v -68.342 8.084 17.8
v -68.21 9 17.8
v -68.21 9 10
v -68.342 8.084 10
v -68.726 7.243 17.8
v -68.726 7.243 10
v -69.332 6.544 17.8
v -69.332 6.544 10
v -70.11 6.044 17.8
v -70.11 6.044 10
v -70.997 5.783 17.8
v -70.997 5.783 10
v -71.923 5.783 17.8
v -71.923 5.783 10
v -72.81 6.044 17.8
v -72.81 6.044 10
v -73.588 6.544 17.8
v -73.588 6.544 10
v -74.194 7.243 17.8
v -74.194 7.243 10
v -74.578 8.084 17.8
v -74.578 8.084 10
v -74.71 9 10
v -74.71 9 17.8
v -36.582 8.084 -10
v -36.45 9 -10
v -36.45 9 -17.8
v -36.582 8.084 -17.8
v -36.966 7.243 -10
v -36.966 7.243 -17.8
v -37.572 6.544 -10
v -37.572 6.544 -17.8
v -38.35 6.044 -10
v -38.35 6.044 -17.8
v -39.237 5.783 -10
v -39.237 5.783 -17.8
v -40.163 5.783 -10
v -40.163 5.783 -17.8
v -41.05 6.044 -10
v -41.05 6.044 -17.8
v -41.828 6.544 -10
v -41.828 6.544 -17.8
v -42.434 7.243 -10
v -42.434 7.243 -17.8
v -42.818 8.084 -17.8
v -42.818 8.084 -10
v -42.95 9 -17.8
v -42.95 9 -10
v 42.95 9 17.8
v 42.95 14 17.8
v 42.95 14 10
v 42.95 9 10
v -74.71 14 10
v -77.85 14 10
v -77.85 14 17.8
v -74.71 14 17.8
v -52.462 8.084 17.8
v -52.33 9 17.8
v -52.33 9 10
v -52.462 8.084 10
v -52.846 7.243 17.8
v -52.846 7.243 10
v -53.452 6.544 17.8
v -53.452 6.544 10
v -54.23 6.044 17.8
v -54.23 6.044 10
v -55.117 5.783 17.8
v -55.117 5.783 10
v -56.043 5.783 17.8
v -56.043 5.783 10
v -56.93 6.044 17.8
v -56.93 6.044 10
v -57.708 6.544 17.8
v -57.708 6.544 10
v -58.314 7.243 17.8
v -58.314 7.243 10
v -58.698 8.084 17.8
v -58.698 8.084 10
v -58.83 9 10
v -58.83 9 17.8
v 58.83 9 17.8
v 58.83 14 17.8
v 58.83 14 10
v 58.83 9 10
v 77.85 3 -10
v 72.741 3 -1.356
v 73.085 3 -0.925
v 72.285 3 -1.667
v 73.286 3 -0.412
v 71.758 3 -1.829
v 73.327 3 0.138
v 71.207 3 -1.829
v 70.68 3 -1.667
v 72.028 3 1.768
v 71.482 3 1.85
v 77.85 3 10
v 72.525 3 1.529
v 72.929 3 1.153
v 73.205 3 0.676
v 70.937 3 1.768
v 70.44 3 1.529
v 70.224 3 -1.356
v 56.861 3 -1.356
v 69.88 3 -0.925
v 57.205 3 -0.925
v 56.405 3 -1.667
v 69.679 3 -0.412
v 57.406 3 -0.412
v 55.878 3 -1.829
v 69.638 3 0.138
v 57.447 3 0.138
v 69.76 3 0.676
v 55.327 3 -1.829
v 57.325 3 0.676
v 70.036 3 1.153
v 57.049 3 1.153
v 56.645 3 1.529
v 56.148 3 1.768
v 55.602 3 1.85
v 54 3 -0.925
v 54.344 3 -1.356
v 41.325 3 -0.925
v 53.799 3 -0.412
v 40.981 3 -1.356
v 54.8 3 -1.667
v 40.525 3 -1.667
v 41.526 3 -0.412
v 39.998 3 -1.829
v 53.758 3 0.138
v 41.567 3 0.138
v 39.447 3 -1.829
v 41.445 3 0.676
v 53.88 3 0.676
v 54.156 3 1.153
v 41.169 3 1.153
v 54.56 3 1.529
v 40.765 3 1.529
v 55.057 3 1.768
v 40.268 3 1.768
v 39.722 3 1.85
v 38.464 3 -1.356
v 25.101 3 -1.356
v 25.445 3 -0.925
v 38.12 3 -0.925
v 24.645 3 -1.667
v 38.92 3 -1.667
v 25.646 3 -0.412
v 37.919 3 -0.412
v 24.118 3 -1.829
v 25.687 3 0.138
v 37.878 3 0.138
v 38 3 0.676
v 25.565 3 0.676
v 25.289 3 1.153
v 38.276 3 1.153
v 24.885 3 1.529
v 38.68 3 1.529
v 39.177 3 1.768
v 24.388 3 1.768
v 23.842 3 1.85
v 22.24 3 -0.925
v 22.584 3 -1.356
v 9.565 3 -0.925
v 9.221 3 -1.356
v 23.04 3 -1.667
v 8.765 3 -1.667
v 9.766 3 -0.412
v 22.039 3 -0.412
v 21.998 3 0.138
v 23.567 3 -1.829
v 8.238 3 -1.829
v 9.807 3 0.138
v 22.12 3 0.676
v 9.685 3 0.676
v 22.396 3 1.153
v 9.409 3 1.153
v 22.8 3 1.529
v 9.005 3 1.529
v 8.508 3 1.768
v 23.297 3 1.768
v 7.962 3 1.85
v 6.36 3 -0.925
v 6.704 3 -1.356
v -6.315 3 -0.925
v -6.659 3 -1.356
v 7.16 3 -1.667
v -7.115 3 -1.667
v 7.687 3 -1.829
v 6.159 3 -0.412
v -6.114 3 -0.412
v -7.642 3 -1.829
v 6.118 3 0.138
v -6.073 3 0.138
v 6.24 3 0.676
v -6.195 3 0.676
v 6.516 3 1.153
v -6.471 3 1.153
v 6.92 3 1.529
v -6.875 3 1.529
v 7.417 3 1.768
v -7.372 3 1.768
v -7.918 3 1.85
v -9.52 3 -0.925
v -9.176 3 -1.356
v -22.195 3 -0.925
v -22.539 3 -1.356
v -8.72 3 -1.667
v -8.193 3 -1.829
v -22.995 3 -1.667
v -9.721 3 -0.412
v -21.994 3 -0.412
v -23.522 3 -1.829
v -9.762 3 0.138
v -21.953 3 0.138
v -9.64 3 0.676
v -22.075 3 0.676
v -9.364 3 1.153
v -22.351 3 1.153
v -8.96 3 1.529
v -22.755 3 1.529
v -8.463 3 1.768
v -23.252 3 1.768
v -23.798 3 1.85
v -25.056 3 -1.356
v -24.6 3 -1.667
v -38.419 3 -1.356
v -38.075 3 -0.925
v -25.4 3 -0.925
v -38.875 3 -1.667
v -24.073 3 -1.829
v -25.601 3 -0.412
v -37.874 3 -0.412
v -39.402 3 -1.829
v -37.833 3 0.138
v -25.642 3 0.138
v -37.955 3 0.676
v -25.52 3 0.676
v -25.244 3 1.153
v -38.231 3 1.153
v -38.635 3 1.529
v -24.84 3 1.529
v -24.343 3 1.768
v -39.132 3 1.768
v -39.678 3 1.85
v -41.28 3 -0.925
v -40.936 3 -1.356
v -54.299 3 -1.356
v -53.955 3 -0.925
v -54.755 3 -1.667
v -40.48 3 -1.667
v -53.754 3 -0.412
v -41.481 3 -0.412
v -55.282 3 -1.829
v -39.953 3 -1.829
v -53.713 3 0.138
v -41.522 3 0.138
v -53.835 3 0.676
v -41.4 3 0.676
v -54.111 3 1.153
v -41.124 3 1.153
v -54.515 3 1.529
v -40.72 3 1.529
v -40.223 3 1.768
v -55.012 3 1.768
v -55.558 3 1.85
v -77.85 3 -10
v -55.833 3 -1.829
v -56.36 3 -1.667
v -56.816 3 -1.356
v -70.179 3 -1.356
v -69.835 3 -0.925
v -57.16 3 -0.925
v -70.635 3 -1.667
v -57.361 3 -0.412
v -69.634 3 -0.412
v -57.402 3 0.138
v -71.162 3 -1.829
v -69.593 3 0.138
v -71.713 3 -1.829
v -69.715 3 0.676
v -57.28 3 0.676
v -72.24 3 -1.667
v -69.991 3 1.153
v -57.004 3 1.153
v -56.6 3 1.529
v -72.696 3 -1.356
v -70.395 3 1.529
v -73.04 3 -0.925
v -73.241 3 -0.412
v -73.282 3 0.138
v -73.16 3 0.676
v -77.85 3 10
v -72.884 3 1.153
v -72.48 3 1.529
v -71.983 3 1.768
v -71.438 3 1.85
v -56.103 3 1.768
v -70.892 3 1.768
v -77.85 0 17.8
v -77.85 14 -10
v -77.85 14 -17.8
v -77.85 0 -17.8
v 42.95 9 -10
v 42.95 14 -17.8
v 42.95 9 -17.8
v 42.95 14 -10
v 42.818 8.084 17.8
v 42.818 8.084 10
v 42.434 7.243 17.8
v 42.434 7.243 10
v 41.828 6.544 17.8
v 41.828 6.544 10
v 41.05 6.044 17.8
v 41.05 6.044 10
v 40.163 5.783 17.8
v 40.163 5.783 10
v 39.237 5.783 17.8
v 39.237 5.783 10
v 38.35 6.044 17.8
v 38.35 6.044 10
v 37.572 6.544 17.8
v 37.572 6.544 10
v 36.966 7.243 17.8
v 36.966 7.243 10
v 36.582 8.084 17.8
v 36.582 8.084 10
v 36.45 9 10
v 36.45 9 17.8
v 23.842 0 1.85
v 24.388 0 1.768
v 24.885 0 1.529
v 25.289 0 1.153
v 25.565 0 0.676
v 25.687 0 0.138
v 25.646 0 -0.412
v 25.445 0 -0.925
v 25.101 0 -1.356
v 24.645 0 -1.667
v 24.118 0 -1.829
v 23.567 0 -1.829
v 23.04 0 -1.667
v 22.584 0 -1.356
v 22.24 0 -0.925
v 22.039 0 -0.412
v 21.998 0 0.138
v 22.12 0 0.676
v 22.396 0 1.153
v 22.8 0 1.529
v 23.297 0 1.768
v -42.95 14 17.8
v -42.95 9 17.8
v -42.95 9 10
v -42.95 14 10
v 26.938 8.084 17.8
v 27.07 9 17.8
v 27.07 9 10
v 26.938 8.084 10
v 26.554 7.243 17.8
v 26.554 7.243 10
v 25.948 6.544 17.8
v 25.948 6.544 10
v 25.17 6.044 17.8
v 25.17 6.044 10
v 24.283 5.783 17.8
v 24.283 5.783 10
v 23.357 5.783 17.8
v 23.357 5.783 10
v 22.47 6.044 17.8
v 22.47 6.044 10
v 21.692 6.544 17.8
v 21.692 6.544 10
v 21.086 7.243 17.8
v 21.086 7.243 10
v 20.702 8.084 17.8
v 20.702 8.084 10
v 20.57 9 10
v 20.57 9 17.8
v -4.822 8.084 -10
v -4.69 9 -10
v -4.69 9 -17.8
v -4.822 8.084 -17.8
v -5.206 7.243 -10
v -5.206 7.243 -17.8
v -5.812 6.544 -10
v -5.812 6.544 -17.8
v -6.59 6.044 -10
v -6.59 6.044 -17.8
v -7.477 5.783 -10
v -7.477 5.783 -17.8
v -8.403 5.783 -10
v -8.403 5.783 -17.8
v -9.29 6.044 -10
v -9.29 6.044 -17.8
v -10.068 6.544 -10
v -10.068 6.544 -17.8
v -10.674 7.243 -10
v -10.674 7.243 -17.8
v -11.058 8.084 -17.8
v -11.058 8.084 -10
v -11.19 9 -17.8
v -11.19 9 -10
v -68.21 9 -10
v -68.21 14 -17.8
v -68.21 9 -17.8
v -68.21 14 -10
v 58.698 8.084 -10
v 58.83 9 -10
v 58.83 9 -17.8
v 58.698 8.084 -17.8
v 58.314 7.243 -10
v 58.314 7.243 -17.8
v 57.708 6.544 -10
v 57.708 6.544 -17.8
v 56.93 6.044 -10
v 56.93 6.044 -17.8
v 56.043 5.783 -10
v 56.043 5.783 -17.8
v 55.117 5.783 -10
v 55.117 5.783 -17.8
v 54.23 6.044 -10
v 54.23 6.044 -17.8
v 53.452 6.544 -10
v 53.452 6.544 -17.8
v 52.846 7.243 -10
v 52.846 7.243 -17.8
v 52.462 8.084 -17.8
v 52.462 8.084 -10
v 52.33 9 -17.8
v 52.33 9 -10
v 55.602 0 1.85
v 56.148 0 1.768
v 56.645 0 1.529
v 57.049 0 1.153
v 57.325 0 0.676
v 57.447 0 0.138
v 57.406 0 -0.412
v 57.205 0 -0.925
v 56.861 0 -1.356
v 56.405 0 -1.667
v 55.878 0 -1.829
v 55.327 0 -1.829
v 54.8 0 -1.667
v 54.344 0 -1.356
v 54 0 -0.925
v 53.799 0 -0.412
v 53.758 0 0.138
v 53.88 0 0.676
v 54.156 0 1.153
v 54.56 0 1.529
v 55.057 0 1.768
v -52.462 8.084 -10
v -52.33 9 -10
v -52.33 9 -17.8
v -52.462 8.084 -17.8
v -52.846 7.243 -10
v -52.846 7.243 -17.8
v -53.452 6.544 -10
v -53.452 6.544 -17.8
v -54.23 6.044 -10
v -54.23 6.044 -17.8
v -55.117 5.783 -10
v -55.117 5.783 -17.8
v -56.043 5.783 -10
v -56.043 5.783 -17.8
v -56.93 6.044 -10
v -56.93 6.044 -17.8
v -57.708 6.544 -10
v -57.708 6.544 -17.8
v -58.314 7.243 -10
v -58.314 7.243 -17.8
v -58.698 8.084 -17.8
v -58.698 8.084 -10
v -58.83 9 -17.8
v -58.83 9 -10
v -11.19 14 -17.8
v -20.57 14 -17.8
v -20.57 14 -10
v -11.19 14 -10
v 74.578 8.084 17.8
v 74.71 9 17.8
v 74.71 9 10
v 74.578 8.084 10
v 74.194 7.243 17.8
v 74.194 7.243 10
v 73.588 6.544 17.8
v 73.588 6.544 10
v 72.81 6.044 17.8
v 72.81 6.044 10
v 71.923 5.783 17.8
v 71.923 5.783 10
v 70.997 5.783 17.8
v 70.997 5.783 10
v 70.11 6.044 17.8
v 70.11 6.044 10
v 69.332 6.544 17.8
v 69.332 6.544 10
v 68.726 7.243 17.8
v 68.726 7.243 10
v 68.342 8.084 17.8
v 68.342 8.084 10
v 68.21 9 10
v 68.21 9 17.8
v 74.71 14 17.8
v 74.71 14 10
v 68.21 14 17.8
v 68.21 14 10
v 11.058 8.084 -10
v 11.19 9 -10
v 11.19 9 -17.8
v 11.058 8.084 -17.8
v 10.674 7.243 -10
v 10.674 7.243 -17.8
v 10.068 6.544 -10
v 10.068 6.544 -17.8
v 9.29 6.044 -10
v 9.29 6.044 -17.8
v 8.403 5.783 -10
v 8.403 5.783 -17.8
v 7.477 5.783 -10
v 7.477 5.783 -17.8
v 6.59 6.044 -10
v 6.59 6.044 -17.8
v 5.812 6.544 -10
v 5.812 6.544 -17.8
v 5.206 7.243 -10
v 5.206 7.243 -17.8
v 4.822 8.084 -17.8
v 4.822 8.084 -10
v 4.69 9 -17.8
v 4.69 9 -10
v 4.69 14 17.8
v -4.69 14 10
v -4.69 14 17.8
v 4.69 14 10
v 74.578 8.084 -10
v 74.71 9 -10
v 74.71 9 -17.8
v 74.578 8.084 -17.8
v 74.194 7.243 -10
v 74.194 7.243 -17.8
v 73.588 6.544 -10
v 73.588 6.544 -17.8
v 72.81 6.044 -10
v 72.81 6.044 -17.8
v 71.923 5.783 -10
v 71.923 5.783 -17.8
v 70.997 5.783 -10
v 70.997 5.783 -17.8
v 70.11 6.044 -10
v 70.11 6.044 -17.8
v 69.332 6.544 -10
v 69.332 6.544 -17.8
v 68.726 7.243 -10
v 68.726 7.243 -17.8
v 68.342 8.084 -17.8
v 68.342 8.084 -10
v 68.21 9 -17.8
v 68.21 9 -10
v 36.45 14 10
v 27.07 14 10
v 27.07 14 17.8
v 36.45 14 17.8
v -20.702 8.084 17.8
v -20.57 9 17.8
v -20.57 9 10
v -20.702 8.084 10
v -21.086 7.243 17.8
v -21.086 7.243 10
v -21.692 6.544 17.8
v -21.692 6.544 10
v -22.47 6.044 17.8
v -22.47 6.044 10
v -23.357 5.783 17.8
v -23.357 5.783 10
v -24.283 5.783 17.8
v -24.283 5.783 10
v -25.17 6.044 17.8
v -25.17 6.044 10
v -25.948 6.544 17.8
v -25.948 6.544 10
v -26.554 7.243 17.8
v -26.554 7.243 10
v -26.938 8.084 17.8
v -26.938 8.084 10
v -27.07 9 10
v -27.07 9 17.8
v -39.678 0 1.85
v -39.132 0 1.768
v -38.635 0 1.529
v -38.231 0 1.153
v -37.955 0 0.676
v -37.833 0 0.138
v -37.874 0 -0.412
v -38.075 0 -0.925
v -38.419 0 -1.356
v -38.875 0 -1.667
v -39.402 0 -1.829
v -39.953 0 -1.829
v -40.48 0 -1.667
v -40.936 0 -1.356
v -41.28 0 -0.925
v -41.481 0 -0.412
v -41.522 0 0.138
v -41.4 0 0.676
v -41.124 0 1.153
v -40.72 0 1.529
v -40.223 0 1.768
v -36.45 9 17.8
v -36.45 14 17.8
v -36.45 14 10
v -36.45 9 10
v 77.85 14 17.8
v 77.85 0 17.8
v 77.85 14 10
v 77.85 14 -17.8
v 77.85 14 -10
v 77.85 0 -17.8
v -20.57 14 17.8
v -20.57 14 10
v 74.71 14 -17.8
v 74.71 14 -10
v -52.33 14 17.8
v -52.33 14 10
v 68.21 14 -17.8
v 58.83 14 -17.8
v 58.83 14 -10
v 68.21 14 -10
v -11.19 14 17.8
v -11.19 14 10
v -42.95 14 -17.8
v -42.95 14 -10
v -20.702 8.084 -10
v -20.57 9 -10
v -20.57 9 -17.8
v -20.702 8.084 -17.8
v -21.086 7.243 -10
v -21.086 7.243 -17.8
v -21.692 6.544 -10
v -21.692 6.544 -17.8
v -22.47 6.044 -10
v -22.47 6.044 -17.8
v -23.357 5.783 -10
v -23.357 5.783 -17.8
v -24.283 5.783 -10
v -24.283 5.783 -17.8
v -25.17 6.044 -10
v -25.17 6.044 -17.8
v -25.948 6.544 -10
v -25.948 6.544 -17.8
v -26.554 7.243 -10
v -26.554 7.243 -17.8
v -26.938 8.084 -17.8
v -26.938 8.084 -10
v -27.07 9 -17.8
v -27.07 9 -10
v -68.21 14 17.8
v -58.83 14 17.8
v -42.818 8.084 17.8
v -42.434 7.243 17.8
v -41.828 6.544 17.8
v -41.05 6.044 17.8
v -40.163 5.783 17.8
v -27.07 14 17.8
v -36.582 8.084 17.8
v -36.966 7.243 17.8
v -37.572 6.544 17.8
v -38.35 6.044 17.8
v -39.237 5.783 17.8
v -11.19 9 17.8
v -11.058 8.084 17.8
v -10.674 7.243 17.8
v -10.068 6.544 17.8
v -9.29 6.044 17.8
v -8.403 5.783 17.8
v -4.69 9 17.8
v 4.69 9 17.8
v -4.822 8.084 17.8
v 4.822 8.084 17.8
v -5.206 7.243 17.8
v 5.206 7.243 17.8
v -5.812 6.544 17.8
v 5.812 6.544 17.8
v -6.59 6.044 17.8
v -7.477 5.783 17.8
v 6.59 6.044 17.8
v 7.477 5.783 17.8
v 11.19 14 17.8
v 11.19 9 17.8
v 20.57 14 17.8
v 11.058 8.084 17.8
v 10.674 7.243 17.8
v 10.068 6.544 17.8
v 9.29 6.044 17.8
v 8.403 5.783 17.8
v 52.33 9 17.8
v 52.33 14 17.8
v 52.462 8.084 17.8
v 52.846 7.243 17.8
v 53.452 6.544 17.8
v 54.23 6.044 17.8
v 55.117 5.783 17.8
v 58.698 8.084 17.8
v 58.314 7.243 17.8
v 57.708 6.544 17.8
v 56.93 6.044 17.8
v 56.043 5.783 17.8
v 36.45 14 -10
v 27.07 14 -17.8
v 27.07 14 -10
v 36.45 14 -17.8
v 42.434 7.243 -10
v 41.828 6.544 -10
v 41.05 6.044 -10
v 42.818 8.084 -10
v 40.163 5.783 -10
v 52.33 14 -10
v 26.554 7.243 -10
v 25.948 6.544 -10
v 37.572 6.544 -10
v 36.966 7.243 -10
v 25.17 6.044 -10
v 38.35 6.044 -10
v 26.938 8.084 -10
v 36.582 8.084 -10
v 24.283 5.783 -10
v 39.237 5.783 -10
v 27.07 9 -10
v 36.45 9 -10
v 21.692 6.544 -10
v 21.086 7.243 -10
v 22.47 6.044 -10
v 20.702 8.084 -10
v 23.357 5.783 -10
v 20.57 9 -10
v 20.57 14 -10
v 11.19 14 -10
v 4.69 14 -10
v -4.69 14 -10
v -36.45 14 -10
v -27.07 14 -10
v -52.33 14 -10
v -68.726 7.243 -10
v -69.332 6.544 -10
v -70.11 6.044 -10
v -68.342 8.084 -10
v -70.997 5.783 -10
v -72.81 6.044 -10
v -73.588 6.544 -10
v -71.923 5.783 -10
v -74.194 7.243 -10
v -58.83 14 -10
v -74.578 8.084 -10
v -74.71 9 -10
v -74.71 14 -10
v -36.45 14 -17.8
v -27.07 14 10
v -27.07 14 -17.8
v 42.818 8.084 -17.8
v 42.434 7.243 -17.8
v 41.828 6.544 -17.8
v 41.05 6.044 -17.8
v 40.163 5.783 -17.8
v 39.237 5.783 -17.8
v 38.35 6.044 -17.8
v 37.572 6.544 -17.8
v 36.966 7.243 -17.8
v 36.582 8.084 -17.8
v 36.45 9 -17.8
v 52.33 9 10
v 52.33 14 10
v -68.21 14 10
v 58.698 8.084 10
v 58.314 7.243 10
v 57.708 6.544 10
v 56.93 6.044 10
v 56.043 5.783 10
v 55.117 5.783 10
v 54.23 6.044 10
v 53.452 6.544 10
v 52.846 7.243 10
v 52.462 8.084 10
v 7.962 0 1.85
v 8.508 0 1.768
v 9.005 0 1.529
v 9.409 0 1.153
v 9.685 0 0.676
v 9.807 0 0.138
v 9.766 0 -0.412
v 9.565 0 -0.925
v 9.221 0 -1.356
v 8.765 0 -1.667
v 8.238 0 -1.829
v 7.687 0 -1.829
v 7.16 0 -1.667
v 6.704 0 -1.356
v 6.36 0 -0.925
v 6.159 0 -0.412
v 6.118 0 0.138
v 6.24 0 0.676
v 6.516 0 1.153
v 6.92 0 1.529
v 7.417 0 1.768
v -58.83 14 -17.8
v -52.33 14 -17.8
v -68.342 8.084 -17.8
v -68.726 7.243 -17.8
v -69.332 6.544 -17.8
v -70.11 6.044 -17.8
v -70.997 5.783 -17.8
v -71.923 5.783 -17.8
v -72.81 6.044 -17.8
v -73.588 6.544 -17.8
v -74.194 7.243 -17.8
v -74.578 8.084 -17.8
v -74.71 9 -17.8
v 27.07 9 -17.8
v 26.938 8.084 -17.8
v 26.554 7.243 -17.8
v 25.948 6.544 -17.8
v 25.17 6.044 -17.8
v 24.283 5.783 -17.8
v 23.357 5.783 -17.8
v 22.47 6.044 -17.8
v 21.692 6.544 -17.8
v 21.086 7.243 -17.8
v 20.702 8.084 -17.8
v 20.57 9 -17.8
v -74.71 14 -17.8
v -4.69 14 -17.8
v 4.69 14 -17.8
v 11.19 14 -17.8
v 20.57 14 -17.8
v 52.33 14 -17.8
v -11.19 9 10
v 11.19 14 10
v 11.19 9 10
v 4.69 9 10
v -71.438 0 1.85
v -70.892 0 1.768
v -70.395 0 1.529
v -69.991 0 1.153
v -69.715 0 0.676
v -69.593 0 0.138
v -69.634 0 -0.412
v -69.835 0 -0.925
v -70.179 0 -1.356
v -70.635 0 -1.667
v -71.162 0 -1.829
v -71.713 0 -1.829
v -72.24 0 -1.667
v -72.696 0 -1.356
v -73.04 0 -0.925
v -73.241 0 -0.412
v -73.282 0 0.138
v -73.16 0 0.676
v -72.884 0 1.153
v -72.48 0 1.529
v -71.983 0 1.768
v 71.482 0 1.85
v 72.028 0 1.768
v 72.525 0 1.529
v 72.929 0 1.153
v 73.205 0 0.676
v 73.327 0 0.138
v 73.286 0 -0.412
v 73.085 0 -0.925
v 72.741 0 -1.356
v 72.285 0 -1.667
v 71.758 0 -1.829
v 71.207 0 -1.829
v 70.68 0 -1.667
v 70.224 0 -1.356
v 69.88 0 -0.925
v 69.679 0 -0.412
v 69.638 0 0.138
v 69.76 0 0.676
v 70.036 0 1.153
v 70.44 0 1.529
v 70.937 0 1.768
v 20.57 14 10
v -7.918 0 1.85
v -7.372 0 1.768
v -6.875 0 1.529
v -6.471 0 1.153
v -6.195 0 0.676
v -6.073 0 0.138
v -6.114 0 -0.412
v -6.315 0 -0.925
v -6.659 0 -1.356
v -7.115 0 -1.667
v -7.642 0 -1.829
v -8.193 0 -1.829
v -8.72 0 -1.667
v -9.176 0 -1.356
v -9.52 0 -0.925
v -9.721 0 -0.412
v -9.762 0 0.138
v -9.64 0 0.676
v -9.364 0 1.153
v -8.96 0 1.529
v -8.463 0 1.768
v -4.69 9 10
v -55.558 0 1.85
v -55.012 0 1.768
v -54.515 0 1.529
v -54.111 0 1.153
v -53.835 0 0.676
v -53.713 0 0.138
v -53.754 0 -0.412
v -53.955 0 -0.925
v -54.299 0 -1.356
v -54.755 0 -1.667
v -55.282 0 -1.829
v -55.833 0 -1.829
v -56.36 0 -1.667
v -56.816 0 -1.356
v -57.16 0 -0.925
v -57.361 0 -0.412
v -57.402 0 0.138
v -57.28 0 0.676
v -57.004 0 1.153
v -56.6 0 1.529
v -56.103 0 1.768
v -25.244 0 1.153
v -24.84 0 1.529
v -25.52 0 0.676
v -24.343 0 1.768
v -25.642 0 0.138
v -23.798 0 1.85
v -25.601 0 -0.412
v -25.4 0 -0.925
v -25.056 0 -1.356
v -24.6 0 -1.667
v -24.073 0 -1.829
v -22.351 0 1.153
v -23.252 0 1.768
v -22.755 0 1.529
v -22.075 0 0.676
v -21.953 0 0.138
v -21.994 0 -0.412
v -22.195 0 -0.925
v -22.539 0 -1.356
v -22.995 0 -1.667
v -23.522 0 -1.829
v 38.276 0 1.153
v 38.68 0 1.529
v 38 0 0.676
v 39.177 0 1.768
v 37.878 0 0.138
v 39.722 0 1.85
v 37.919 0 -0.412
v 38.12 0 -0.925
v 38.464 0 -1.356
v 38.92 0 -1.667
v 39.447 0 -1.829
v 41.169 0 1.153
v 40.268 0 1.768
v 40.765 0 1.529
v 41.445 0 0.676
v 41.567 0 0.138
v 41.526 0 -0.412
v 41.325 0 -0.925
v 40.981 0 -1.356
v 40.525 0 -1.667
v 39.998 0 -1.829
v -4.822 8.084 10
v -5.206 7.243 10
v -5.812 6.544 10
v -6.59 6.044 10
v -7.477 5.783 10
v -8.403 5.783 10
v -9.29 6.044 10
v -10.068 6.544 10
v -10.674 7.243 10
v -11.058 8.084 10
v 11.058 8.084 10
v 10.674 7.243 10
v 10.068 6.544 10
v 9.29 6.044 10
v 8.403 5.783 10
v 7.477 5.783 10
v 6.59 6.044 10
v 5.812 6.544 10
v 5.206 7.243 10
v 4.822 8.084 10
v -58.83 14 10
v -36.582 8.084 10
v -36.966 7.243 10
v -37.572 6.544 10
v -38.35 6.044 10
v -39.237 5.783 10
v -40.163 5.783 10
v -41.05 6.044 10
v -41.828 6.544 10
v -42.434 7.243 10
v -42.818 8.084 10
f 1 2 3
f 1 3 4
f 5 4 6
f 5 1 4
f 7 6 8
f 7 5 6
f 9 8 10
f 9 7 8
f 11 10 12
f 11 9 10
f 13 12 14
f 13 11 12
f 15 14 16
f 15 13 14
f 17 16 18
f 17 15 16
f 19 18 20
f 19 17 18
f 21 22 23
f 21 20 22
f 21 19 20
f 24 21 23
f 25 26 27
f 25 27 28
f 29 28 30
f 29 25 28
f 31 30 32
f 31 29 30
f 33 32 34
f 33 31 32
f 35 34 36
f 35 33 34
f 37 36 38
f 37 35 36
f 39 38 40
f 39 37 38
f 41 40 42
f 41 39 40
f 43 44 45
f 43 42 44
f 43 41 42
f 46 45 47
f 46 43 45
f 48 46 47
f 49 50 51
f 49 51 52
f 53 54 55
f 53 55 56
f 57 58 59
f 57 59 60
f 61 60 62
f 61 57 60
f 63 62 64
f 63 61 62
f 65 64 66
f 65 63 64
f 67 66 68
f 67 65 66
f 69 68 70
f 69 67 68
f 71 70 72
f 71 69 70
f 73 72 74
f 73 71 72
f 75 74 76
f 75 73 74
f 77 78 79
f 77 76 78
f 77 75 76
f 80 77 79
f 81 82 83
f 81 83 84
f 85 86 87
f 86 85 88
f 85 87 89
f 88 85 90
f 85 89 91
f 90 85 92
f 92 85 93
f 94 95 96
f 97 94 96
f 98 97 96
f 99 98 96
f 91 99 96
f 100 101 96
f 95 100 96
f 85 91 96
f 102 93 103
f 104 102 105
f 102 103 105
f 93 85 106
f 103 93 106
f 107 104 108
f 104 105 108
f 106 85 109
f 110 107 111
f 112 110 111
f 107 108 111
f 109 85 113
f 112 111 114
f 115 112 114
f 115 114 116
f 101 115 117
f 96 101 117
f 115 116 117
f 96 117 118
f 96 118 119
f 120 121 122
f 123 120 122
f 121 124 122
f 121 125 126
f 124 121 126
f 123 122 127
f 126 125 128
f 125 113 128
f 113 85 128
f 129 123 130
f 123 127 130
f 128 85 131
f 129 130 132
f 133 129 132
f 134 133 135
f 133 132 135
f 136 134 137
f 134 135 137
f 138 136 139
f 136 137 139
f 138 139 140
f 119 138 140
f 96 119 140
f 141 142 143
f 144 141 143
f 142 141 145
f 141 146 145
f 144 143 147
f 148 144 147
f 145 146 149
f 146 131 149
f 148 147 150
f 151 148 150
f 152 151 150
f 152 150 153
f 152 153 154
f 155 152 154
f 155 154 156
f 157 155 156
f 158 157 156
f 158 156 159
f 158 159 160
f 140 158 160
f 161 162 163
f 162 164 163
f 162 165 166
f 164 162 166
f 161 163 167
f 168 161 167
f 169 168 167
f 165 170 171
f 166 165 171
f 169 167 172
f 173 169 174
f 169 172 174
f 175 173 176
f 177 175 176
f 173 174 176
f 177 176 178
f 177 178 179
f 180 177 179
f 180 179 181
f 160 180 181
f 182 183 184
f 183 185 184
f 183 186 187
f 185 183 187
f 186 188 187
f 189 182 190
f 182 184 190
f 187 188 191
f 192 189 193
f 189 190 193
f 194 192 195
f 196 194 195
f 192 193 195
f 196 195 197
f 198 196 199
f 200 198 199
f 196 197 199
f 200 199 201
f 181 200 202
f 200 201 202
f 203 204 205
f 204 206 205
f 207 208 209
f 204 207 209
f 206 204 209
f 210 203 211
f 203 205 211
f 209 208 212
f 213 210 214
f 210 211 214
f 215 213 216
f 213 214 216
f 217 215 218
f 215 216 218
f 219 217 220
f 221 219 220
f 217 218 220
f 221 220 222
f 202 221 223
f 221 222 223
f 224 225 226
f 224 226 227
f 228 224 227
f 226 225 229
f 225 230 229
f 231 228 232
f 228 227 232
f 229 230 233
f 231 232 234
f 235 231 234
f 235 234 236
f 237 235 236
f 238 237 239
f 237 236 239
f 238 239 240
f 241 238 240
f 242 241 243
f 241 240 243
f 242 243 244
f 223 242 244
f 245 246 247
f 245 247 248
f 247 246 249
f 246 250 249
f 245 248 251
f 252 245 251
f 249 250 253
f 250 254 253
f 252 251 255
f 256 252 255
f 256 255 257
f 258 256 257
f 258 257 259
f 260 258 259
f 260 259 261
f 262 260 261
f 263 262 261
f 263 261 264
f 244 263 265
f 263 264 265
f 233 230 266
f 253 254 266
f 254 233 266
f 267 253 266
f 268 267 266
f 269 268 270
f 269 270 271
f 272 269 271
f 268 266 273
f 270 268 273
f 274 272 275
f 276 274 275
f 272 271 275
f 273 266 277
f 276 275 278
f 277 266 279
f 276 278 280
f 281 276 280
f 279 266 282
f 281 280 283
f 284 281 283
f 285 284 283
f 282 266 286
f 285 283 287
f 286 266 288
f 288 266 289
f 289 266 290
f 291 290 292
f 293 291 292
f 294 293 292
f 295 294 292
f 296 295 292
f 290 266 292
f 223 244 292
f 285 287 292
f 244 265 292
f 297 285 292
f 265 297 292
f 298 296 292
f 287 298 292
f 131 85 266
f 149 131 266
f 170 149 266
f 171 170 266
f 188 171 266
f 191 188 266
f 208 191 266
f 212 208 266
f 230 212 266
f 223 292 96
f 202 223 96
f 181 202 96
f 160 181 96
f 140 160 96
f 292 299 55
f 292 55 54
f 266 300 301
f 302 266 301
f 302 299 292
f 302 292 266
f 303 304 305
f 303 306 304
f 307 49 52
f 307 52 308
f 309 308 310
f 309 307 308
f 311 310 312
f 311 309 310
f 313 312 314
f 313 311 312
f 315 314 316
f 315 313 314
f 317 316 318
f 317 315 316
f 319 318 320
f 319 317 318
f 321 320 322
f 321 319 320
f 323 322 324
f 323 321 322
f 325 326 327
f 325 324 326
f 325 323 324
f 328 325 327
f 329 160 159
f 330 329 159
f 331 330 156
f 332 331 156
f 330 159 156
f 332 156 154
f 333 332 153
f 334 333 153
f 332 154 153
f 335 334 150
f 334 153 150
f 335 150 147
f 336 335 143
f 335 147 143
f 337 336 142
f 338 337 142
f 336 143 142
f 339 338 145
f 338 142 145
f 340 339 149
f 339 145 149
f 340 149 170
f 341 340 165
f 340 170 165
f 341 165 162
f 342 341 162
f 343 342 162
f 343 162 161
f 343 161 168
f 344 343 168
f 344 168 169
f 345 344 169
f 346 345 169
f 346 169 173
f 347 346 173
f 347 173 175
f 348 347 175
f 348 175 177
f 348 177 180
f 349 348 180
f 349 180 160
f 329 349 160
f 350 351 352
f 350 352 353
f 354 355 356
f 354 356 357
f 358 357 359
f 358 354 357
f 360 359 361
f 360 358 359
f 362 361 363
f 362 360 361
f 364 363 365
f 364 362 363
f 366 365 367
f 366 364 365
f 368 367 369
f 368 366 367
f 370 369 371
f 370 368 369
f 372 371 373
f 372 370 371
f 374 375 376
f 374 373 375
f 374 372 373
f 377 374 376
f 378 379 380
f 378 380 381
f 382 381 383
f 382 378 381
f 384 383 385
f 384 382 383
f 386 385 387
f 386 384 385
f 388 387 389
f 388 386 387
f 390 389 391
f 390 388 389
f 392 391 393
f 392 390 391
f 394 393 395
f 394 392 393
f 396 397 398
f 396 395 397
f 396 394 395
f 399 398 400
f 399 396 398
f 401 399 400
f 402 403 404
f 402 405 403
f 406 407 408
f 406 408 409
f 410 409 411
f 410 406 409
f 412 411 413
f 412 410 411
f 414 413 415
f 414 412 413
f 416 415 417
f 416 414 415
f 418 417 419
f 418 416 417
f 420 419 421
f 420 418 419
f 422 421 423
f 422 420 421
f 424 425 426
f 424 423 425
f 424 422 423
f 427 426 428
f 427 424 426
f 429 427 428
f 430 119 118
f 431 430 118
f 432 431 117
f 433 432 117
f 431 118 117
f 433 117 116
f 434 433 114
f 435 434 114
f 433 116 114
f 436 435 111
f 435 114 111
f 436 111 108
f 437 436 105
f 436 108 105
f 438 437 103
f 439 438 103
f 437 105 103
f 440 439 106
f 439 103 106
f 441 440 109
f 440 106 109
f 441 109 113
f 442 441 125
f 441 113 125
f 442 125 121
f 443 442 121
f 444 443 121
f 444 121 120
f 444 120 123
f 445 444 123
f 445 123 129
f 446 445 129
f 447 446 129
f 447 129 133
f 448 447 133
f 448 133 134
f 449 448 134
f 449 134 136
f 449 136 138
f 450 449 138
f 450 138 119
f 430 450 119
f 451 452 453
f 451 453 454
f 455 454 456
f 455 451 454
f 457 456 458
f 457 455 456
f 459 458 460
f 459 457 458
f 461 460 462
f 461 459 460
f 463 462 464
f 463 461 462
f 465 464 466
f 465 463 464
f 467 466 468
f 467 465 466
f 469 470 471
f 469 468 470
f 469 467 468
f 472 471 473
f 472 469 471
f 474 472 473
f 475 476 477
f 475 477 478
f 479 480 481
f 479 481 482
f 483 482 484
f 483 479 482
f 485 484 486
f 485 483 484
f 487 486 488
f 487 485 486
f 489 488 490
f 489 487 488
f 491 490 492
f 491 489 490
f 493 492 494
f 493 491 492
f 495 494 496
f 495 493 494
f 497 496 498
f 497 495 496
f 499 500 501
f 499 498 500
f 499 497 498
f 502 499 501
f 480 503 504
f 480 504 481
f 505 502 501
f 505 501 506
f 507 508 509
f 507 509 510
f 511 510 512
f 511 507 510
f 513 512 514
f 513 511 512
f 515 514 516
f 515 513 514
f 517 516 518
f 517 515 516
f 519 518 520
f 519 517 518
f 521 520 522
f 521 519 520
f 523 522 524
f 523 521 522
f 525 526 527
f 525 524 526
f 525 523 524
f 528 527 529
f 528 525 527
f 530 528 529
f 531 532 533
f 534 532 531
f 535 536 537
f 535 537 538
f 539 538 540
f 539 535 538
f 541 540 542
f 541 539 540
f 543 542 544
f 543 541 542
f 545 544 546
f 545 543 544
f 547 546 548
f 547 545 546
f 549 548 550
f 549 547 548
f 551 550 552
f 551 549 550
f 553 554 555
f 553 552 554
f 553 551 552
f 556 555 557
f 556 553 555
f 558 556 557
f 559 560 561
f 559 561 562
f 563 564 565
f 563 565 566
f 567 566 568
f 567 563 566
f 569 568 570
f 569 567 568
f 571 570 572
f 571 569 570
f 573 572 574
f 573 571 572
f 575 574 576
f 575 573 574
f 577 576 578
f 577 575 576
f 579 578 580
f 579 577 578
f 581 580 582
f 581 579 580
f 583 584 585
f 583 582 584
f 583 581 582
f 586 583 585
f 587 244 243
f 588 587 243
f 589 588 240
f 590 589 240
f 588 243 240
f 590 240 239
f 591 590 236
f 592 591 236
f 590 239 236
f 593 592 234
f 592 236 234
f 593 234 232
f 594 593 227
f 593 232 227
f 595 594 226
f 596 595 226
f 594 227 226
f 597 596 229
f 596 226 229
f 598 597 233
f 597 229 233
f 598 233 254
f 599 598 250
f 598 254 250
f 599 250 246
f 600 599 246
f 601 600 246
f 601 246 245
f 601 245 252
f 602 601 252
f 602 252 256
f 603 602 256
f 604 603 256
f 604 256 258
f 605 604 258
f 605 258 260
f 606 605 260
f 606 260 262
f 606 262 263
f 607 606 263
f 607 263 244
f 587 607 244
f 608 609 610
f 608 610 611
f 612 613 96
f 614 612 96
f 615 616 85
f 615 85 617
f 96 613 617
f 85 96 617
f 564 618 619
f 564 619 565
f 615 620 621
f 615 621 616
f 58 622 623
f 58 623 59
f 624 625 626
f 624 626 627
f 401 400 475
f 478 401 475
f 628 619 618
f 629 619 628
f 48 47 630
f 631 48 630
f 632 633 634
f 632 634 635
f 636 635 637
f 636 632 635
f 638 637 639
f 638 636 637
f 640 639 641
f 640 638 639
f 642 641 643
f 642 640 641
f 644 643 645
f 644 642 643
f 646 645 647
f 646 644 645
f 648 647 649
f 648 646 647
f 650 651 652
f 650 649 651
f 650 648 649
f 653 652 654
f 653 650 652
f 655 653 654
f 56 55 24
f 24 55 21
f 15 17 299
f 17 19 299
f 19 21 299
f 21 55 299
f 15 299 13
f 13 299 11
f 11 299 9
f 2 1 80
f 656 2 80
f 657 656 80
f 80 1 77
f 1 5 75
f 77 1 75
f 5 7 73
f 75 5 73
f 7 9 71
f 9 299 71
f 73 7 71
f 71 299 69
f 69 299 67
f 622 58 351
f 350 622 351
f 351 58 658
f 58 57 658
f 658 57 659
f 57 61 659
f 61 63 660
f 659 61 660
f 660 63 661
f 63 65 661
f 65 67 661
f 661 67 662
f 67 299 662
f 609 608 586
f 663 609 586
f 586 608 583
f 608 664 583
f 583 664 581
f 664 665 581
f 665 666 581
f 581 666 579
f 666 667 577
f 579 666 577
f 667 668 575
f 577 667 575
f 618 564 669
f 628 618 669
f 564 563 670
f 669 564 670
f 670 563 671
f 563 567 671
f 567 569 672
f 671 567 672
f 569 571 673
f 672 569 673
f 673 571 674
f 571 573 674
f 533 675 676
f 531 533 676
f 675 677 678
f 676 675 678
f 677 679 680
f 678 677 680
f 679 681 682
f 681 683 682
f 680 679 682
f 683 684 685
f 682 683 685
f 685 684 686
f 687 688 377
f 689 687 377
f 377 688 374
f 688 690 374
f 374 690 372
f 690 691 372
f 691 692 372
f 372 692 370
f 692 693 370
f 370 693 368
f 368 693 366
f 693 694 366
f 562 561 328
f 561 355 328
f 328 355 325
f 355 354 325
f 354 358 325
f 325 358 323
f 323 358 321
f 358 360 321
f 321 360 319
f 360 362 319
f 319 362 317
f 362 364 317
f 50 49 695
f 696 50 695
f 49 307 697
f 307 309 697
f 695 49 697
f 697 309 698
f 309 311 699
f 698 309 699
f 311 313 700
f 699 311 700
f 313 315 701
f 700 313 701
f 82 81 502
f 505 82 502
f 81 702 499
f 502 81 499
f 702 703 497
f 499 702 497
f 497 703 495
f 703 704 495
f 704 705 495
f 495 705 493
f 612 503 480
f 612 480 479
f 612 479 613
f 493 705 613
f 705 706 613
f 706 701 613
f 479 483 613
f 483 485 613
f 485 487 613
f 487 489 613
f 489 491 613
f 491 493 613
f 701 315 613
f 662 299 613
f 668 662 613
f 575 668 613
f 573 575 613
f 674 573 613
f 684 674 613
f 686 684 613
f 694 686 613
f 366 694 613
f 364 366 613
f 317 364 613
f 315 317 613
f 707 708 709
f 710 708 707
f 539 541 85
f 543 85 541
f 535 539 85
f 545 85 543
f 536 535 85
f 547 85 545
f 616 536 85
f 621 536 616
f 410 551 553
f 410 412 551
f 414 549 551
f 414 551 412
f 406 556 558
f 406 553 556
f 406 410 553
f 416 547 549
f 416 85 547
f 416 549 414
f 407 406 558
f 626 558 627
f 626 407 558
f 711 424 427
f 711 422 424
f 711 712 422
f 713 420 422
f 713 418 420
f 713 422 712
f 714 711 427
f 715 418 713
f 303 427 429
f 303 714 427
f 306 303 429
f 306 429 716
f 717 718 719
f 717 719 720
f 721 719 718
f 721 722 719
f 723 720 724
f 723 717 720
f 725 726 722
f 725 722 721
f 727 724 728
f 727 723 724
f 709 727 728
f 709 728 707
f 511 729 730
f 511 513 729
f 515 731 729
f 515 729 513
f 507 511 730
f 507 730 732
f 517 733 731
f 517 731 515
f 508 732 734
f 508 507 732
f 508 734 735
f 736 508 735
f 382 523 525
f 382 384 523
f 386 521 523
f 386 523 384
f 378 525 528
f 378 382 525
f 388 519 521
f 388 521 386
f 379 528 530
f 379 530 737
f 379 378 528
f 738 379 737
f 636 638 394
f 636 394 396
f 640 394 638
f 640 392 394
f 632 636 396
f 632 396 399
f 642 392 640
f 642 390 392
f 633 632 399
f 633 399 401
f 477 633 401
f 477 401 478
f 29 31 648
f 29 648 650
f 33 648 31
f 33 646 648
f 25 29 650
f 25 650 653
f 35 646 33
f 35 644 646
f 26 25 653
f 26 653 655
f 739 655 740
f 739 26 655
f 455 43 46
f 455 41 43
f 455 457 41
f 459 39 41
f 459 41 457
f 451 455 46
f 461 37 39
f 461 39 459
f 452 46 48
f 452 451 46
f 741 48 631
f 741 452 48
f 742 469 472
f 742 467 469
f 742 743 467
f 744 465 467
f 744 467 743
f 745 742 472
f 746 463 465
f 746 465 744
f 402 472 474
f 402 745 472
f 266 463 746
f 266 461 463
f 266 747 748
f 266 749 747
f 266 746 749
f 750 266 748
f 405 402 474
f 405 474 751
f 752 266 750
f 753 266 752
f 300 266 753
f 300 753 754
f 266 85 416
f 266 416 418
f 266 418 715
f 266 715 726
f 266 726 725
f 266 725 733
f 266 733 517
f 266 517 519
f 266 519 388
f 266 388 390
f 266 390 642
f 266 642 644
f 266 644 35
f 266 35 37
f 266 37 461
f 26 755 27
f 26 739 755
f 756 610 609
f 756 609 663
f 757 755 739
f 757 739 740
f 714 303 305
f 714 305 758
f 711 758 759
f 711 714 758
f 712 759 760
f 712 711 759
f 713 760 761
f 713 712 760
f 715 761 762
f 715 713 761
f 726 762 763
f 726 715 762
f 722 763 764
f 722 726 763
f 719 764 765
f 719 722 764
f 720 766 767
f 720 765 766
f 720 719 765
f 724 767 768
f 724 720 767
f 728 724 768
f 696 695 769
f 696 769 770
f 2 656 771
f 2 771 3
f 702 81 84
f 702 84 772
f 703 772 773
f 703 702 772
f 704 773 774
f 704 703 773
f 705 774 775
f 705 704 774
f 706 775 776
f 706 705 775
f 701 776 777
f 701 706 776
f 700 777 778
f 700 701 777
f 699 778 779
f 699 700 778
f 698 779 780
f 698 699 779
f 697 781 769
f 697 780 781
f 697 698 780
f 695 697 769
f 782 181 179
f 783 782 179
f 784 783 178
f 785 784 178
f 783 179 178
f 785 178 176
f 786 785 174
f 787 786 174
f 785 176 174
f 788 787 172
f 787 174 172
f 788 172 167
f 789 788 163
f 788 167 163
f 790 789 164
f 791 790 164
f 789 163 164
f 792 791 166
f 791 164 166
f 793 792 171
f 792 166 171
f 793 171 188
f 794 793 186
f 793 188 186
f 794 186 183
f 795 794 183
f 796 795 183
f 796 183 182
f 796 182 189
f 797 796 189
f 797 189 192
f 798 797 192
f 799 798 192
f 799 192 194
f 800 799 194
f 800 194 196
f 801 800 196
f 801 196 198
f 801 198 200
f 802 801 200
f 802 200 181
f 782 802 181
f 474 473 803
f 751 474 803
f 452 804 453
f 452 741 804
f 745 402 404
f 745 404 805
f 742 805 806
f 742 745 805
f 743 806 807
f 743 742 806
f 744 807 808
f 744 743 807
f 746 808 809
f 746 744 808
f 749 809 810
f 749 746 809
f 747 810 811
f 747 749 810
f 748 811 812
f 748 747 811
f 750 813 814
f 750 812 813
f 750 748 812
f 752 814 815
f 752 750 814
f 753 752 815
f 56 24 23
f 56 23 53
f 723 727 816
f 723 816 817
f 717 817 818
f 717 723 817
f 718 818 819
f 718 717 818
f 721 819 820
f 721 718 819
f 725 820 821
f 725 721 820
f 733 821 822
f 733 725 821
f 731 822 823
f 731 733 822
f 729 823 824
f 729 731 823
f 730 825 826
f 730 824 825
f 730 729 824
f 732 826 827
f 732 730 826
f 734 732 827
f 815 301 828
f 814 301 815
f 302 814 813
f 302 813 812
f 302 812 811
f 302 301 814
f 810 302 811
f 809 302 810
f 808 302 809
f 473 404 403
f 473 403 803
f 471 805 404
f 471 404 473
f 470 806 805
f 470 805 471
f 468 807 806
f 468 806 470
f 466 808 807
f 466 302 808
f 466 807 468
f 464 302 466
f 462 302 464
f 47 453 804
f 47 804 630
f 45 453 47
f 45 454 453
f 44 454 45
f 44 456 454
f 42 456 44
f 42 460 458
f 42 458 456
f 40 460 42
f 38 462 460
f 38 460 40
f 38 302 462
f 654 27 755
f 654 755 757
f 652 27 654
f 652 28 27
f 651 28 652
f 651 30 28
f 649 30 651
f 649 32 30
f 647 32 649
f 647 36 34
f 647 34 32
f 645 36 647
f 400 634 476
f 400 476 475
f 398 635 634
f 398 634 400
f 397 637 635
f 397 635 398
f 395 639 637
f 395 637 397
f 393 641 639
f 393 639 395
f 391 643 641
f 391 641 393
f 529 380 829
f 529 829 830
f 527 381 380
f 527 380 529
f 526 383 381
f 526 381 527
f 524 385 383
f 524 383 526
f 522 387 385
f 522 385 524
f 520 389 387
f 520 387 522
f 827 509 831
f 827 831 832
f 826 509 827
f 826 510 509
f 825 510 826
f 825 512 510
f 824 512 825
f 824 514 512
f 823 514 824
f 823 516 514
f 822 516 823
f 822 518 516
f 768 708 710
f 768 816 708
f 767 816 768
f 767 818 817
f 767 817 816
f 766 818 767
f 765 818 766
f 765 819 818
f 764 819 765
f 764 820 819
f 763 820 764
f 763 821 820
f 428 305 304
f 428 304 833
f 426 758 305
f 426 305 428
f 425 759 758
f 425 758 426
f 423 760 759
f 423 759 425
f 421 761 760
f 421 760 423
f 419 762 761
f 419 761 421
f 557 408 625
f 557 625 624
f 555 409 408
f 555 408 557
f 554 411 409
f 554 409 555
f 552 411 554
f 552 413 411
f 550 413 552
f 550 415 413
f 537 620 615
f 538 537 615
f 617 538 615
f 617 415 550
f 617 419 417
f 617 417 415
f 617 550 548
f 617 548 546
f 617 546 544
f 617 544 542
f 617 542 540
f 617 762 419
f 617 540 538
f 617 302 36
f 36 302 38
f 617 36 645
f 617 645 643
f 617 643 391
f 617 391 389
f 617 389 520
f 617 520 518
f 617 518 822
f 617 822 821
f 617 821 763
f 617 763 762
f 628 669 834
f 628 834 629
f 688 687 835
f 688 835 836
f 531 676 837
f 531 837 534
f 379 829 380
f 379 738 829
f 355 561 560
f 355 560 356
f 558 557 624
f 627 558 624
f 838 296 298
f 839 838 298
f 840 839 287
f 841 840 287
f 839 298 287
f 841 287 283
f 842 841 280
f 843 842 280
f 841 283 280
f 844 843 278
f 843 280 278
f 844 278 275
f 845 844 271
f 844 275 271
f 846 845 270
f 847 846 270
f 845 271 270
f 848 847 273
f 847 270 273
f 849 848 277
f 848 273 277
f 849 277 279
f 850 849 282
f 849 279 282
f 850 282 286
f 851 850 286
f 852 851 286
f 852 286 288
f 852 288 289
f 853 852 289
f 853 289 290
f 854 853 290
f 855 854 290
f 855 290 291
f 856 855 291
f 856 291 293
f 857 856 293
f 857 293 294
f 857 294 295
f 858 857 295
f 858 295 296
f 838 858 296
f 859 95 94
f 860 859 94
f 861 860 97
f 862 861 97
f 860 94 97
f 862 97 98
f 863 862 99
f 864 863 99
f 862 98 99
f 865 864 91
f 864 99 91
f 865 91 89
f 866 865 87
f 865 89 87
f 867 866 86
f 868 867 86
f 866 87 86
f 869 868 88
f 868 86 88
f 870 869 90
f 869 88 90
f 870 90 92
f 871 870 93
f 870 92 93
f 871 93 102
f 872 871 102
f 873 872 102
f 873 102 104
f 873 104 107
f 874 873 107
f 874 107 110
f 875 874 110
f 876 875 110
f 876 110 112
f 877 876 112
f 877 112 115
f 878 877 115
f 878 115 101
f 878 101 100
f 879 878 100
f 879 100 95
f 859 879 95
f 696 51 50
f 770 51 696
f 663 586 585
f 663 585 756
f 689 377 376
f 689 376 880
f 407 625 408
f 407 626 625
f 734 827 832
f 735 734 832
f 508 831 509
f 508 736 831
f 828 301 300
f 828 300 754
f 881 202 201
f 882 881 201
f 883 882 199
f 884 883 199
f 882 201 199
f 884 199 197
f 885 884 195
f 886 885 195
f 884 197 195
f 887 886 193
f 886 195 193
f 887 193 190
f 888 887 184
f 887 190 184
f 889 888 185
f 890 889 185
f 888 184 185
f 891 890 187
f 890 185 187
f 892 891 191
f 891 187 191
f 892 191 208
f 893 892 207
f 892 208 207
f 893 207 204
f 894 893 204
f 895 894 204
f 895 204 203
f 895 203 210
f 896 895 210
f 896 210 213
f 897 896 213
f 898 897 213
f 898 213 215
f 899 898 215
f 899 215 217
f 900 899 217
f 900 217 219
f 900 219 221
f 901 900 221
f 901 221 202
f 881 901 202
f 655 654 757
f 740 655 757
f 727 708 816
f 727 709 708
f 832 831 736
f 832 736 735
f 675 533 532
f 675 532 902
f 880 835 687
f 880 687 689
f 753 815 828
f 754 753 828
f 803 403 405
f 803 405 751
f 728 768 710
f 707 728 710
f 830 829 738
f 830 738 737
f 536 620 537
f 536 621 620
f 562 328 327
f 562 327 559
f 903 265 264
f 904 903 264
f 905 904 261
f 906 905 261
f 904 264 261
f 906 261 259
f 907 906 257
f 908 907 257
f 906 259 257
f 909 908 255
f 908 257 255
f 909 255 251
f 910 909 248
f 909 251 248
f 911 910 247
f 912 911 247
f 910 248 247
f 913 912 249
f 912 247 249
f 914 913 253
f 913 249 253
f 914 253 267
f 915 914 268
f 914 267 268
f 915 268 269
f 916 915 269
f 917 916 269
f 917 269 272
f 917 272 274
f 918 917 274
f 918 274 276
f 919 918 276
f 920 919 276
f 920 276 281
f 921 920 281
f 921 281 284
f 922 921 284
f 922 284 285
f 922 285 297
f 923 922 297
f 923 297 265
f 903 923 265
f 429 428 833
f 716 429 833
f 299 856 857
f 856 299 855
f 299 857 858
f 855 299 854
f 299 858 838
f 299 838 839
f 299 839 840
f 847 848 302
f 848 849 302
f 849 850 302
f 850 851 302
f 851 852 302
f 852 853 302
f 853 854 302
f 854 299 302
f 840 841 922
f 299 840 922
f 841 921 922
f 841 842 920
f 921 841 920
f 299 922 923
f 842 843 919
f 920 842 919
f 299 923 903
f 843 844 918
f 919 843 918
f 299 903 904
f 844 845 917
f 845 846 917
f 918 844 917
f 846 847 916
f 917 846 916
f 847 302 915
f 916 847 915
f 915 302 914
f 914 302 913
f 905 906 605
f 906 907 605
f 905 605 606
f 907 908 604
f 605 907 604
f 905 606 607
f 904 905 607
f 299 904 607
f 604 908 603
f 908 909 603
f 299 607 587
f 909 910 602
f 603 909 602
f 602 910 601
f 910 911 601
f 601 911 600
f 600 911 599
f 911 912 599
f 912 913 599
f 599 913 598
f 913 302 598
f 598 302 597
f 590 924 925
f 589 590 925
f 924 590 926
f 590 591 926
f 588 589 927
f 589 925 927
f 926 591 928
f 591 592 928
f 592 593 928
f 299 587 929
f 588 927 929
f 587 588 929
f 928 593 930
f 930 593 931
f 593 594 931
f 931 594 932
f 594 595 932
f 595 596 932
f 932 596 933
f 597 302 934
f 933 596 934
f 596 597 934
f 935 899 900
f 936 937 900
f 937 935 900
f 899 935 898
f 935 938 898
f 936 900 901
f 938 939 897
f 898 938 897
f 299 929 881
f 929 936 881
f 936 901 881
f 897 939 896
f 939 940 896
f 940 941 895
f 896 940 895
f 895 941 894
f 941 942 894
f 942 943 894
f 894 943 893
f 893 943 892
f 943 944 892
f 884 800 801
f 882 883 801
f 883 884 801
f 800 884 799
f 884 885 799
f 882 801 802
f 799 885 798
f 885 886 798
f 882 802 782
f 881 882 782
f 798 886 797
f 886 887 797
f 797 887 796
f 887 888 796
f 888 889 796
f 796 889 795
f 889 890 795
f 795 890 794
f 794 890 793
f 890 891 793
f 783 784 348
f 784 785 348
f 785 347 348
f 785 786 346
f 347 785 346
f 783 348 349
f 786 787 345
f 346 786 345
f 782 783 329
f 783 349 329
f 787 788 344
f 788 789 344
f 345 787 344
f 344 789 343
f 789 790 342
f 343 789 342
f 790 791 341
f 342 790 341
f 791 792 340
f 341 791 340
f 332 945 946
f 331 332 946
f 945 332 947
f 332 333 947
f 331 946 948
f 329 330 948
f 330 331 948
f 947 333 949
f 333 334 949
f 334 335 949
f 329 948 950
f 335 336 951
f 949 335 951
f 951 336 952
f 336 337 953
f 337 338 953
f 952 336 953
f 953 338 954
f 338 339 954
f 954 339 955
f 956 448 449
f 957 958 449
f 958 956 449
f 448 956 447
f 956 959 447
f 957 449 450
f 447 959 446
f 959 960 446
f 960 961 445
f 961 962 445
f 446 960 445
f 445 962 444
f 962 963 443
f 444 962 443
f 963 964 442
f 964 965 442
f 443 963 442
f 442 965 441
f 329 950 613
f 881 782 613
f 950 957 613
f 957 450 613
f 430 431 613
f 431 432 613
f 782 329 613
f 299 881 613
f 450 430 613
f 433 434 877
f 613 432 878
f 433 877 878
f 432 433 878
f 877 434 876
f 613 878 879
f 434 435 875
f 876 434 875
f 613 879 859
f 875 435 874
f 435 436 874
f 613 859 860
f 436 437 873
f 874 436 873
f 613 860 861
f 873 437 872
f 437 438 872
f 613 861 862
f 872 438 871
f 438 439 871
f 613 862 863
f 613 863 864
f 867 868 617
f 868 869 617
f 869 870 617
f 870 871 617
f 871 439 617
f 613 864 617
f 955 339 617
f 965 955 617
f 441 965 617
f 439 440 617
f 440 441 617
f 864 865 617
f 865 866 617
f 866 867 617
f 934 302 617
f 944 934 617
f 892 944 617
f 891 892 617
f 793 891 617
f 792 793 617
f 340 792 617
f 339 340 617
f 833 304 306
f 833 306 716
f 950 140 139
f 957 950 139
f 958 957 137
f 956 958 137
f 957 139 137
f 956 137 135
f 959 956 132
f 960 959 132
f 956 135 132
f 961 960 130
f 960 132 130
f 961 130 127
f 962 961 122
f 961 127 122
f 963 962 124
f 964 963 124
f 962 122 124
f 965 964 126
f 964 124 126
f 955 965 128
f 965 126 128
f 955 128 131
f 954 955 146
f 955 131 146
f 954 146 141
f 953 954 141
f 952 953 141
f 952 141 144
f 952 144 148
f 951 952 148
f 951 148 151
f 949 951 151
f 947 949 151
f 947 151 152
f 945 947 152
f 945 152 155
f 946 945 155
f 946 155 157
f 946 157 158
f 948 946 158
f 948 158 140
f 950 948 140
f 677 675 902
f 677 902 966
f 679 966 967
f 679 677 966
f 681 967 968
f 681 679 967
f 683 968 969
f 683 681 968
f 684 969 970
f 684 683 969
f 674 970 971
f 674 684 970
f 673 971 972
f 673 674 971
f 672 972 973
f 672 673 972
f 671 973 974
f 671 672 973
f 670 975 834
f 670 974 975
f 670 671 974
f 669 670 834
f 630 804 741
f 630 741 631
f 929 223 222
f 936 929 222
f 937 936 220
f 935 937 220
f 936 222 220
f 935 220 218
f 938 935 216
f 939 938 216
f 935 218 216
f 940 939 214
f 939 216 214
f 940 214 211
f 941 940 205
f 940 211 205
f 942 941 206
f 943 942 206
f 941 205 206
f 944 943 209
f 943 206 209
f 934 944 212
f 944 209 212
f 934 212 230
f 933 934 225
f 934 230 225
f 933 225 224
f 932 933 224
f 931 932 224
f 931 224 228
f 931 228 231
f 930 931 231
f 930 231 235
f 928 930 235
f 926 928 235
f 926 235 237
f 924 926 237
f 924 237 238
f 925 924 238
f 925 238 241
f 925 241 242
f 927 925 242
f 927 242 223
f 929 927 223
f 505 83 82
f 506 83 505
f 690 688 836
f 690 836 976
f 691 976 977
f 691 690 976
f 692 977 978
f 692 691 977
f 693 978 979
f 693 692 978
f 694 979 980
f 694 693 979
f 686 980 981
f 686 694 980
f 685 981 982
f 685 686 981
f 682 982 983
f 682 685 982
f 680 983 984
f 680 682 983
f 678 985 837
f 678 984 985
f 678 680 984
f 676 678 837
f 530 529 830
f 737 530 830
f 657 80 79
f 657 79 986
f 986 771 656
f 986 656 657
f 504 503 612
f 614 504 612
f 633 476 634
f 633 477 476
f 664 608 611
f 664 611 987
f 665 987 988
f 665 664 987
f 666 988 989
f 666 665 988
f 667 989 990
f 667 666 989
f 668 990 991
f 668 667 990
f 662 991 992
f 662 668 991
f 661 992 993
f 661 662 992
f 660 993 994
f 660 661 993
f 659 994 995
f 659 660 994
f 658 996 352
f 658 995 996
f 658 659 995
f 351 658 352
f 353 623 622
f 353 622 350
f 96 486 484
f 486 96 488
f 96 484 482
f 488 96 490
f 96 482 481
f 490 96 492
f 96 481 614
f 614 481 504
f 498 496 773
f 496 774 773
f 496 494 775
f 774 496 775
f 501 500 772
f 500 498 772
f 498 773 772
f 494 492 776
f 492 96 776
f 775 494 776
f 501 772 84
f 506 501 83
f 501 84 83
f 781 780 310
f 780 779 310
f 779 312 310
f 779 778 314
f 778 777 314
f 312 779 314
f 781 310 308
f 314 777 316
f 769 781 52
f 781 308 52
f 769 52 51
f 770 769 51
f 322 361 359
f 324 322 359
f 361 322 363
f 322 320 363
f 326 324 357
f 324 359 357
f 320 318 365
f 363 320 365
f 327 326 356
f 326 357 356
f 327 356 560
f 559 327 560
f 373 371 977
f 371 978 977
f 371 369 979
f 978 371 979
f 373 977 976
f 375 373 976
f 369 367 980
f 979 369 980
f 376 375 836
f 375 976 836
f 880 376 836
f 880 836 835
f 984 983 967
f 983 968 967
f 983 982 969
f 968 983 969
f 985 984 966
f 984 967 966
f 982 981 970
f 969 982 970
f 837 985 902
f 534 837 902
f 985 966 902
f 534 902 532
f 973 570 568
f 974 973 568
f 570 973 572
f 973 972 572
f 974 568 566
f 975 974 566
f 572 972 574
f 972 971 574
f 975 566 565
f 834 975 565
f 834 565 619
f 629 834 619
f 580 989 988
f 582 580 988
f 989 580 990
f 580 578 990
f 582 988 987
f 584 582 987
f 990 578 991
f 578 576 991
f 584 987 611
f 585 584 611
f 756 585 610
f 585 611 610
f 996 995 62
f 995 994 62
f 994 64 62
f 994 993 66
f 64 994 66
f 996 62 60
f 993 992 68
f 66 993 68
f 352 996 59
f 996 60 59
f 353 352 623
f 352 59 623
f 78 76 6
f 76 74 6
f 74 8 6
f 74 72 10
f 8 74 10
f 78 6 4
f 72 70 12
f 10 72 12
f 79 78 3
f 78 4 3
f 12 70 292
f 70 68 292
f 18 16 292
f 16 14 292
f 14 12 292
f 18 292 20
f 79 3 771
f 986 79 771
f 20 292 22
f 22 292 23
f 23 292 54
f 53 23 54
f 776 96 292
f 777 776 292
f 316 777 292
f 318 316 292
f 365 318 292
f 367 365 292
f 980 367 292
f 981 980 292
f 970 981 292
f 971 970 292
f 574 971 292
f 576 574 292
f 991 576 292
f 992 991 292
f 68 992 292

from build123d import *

# Parameters (mm, degrees)
SKETCH1_W           = 155.7
SKETCH1_H           = 35.6
BOSS_EXTRUDE1_DEPTH = 14
SKETCH3_R           = 1.85
CUT_EXTRUDE1_DEPTH  = 82.076892516
SKETCH4_W           = 20
SKETCH4_H           = 11
CUT_EXTRUDE2_DEPTH  = 158.338266166
CUT_EXTRUDE3_DEPTH  = 87.740892894


with BuildPart() as part:
    # Sketch1 → Boss-Extrude1 (new body)
    with BuildSketch(Plane(origin=(0, 0, 0), x_dir=(1, 0, 0), z_dir=(0, 1, 0))):
        Rectangle(SKETCH1_W, SKETCH1_H)
    extrude(amount=BOSS_EXTRUDE1_DEPTH)

    # Sketch3 → Cut-Extrude1 (cut, through all)
    with BuildSketch(Plane(origin=(0, 14, 0), x_dir=(1, 0, 0), z_dir=(0, 1, 0))):
        with Locations(Location((-71.4375, 0, 0), (0, 0, 270))):
            Circle(SKETCH3_R)
        with Locations(Location((-55.5575, 0, 0), (0, 0, 270))):
            Circle(SKETCH3_R)
        with Locations(Location((-39.6775, 0, 0), (0, 0, 270))):
            Circle(SKETCH3_R)
        with Locations(Location((-23.7975, 0, 0), (0, 0, 270))):
            Circle(SKETCH3_R)
        with Locations(Location((-7.9175, 0, 0), (0, 0, 270))):
            Circle(SKETCH3_R)
        with Locations(Location((7.9625, 0, 0), (0, 0, 270))):
            Circle(SKETCH3_R)
        with Locations(Location((23.8425, 0, 0), (0, 0, 270))):
            Circle(SKETCH3_R)
        with Locations(Location((39.7225, 0, 0), (0, 0, 270))):
            Circle(SKETCH3_R)
        with Locations(Location((55.6025, 0, 0), (0, 0, 270))):
            Circle(SKETCH3_R)
        with Locations(Location((71.4825, 0, 0), (0, 0, 270))):
            Circle(SKETCH3_R)
    extrude(amount=-CUT_EXTRUDE1_DEPTH, mode=Mode.SUBTRACT)

    # Sketch4 → Cut-Extrude2 (cut, through all)
    with BuildSketch(Plane.ZY.offset(77.85)):
        with Locations((0, 8.5)):
            Rectangle(SKETCH4_W, SKETCH4_H)
    extrude(amount=-CUT_EXTRUDE2_DEPTH, mode=Mode.SUBTRACT)

    # Sketch5 → Cut-Extrude3 (cut, through all)
    with BuildSketch(Plane.XY.offset(17.8)):
        with BuildLine():
            Line((-74.71, 9), (-74.71, 15))
            Line((-74.71, 15), (-68.21, 15))
            Line((-68.21, 15), (-68.21, 9))
            ThreePointArc((-68.21, 9), (-71.46, 5.75), (-74.71, 9))
        make_face()
        with BuildLine():
            Line((-52.33, 15), (-52.33, 9))
            ThreePointArc((-52.33, 9), (-55.58, 5.75), (-58.83, 9))
            Line((-58.83, 9), (-58.83, 15))
            Line((-58.83, 15), (-52.33, 15))
        make_face()
        with BuildLine():
            Line((-36.45, 15), (-36.45, 9))
            ThreePointArc((-36.45, 9), (-39.7, 5.75), (-42.95, 9))
            Line((-42.95, 9), (-42.95, 15))
            Line((-42.95, 15), (-36.45, 15))
        make_face()
        with BuildLine():
            Line((-20.57, 15), (-20.57, 9))
            ThreePointArc((-20.57, 9), (-23.82, 5.75), (-27.07, 9))
            Line((-27.07, 9), (-27.07, 15))
            Line((-27.07, 15), (-20.57, 15))
        make_face()
        with BuildLine():
            Line((-4.69, 15), (-4.69, 9))
            ThreePointArc((-4.69, 9), (-7.94, 5.75), (-11.19, 9))
            Line((-11.19, 9), (-11.19, 15))
            Line((-11.19, 15), (-4.69, 15))
        make_face()
        with BuildLine():
            Line((11.19, 15), (11.19, 9))
            ThreePointArc((11.19, 9), (7.94, 5.75), (4.69, 9))
            Line((4.69, 9), (4.69, 15))
            Line((4.69, 15), (11.19, 15))
        make_face()
        with BuildLine():
            Line((27.07, 15), (27.07, 9))
            ThreePointArc((27.07, 9), (23.82, 5.75), (20.57, 9))
            Line((20.57, 9), (20.57, 15))
            Line((20.57, 15), (27.07, 15))
        make_face()
        with BuildLine():
            Line((42.95, 15), (42.95, 9))
            ThreePointArc((42.95, 9), (39.7, 5.75), (36.45, 9))
            Line((36.45, 9), (36.45, 15))
            Line((36.45, 15), (42.95, 15))
        make_face()
        with BuildLine():
            Line((58.83, 15), (58.83, 9))
            ThreePointArc((58.83, 9), (55.58, 5.75), (52.33, 9))
            Line((52.33, 9), (52.33, 15))
            Line((52.33, 15), (58.83, 15))
        make_face()
        with BuildLine():
            Line((74.71, 15), (74.71, 9))
            ThreePointArc((74.71, 9), (71.46, 5.75), (68.21, 9))
            Line((68.21, 9), (68.21, 15))
            Line((68.21, 15), (74.71, 15))
        make_face()
    extrude(amount=-CUT_EXTRUDE3_DEPTH, mode=Mode.SUBTRACT)


solid = part.part
